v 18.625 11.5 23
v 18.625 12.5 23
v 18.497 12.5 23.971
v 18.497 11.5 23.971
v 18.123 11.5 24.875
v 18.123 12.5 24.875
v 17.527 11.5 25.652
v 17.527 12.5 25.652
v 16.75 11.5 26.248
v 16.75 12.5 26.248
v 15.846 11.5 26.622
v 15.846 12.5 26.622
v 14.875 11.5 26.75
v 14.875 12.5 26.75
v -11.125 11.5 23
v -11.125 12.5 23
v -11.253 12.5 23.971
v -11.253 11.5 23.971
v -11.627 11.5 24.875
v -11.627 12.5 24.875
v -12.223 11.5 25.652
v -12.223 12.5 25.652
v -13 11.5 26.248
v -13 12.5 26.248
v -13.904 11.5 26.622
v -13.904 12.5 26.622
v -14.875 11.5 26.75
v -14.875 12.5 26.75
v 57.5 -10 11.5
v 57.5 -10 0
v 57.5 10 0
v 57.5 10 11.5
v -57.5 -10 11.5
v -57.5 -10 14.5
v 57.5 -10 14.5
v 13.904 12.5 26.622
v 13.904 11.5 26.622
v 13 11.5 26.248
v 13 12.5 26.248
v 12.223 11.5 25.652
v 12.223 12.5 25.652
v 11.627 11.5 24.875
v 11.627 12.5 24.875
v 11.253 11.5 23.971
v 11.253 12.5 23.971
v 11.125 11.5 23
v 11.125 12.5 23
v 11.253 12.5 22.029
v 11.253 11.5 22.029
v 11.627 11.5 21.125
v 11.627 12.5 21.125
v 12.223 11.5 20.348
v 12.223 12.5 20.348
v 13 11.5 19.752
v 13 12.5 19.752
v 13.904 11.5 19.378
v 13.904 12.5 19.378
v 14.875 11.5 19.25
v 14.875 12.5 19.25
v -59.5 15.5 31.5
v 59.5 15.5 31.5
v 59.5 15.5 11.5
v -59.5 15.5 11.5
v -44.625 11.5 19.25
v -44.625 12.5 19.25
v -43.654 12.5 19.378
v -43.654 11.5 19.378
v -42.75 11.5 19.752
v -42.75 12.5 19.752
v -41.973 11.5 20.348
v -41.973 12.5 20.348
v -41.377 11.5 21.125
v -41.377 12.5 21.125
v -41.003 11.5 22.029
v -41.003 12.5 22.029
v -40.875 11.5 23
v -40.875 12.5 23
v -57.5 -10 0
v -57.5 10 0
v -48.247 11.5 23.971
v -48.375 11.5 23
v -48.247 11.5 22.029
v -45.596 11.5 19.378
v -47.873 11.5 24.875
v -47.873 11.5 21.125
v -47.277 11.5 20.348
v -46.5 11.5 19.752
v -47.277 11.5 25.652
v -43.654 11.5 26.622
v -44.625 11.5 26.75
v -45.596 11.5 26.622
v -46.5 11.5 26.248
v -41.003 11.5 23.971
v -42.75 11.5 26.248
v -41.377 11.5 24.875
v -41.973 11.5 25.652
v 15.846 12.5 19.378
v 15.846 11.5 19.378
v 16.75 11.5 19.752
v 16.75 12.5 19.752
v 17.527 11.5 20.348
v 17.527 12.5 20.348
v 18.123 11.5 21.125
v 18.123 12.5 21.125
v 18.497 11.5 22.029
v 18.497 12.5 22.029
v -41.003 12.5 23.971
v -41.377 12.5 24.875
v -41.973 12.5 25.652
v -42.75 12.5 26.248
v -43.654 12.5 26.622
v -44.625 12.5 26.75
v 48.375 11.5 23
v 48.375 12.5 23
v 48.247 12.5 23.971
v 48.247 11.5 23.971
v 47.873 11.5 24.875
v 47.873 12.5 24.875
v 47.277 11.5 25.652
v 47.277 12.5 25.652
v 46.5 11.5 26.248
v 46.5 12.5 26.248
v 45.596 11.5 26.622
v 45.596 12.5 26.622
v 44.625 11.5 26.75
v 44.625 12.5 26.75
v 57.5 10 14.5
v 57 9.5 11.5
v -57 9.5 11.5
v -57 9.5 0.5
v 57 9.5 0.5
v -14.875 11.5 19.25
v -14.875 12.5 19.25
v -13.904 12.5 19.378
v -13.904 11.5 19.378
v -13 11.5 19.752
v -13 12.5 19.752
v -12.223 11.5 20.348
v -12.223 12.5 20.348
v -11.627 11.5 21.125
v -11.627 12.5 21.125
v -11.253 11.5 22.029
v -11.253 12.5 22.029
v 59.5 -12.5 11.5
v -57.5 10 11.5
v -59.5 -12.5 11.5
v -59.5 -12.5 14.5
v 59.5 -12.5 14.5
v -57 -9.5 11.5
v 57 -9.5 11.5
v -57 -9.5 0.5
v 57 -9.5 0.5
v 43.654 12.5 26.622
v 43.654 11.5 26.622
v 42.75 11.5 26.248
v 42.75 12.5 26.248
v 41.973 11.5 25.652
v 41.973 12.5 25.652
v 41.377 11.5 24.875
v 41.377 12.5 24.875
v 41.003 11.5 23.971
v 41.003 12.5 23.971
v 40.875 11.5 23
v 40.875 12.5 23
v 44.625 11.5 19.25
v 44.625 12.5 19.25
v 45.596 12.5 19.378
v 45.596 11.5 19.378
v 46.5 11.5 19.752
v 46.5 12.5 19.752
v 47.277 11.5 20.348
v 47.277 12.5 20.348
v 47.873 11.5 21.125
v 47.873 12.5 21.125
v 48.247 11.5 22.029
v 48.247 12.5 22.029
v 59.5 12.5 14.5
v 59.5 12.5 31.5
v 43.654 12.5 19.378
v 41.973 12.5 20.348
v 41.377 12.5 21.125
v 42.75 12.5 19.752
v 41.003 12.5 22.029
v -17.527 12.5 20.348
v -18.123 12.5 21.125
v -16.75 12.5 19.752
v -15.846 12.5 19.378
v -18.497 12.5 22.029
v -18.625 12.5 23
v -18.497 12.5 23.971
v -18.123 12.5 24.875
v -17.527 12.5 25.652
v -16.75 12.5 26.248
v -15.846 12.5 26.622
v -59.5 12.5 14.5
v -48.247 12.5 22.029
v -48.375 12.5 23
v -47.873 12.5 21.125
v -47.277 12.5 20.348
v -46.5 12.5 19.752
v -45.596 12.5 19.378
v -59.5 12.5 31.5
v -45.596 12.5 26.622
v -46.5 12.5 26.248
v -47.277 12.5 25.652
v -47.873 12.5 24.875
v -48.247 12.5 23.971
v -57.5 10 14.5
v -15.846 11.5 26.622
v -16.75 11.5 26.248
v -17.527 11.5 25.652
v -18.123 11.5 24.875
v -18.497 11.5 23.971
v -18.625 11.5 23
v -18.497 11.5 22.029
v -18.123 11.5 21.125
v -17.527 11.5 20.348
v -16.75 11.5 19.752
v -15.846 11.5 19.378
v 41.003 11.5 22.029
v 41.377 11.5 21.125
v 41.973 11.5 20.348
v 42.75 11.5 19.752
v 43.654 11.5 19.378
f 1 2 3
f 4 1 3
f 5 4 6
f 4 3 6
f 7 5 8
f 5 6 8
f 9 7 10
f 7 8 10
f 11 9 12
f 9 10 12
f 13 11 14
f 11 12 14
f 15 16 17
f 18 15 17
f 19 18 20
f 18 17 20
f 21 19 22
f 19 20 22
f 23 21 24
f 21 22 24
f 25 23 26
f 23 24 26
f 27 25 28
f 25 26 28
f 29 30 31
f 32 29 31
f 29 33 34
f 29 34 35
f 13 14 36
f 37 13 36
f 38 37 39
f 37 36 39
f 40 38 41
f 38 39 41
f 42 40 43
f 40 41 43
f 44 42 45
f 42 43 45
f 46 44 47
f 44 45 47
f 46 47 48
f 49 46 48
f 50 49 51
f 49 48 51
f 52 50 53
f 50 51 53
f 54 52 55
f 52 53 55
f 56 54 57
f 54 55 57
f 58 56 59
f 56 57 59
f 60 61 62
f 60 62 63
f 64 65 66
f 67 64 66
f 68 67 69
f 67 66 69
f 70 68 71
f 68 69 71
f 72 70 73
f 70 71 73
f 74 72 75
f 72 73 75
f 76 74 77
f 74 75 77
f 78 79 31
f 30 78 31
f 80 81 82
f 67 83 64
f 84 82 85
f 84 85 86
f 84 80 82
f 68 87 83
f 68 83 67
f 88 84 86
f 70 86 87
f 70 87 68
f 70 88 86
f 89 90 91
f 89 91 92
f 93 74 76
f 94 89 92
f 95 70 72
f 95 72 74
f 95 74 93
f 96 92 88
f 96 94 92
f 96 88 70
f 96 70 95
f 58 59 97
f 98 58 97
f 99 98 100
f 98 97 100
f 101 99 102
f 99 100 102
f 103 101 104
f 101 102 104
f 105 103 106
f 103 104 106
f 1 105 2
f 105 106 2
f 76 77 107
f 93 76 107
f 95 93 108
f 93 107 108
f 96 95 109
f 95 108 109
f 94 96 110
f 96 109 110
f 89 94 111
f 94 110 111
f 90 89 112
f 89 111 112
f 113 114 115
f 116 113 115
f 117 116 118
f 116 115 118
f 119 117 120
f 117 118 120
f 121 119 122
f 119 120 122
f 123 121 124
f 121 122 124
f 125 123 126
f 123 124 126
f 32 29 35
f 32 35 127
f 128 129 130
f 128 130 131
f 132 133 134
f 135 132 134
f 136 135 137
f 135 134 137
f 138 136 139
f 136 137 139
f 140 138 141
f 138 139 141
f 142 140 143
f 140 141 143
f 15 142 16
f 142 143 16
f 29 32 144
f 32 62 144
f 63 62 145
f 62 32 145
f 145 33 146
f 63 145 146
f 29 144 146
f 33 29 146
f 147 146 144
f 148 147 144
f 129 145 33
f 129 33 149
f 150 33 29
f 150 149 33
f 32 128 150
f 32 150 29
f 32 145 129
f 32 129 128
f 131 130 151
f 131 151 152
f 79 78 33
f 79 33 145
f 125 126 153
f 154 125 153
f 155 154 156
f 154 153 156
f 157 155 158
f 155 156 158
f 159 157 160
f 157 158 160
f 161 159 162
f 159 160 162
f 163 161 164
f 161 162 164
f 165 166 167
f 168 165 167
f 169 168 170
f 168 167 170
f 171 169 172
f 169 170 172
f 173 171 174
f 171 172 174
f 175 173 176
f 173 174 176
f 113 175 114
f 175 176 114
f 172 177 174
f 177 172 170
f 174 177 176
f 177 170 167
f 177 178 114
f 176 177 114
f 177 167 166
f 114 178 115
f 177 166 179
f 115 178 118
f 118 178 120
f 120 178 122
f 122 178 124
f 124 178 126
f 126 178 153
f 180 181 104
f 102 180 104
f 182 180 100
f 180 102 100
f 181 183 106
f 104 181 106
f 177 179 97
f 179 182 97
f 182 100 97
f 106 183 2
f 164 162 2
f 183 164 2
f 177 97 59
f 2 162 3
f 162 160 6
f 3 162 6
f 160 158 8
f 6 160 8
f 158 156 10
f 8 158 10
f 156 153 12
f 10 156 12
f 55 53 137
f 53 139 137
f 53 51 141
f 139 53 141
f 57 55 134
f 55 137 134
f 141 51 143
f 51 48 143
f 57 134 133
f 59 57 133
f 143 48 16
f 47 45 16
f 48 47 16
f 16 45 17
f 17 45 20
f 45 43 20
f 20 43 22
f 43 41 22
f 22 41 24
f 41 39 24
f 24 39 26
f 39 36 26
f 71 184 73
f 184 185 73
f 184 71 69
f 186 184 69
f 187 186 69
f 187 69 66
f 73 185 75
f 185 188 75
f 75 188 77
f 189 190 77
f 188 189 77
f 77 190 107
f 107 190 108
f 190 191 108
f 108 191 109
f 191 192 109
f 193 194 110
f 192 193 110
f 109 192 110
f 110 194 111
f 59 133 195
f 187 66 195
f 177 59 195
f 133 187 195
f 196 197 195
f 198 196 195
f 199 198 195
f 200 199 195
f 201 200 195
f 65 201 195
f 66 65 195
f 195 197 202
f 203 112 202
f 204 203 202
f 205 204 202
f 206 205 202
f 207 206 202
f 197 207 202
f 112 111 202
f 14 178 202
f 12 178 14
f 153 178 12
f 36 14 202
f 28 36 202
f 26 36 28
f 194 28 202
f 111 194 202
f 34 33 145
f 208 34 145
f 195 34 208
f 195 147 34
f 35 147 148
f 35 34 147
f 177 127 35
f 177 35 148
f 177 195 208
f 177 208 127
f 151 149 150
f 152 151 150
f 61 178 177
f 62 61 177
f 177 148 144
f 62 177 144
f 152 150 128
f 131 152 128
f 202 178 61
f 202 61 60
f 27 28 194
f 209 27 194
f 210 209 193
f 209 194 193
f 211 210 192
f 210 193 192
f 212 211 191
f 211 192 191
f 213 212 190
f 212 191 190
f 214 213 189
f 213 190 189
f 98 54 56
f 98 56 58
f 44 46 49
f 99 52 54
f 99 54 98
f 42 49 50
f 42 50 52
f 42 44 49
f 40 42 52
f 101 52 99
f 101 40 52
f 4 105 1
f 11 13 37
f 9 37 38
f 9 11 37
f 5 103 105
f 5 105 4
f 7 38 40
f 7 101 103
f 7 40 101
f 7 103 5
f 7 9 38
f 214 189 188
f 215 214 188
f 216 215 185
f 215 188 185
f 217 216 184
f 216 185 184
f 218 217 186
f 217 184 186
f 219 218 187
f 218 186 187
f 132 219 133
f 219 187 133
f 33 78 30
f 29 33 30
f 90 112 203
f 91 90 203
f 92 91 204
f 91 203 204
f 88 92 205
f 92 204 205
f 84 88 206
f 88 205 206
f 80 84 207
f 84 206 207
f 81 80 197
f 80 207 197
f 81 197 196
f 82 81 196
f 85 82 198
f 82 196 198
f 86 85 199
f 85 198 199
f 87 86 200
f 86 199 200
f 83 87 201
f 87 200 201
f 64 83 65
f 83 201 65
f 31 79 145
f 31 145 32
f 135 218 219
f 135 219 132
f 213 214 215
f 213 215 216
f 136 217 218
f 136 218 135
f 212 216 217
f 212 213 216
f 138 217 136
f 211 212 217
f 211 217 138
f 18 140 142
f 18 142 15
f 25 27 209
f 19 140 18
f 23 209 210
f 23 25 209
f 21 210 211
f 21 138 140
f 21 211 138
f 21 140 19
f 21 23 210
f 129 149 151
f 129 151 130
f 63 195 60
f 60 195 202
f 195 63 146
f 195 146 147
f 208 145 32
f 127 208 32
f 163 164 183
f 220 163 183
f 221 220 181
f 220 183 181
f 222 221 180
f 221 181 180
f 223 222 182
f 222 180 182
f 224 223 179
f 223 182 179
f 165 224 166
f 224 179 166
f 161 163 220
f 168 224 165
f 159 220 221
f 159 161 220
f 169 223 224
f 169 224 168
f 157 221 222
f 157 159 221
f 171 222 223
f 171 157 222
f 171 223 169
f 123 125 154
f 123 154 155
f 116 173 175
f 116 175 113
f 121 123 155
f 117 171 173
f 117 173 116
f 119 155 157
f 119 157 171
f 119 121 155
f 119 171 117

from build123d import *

# Parameters (mm, degrees)
F0_W     = 115
F0_H     = 20
F1_DEPTH = 11.5
F2_W     = 119
F2_H     = 25
F2_W_2   = 115
F2_H_2   = 20
F3_DEPTH = 3
F4_W     = 114
F4_H     = 19
F5_DEPTH = 11
F6_W     = 119
F6_H     = 17
F6_H_2   = 3
F7_DEPTH = 3
F9_DEPTH = 1


with BuildPart() as f1:
    # F0 (on Top) → F1 (new body)
    with BuildSketch(Plane.XY):
        Rectangle(F0_W, F0_H)
    extrude(amount=F1_DEPTH)

    # F4 (on face) → F5 (cut)
    with BuildSketch(Plane.XY.offset(11.5)):
        Rectangle(F4_W, F4_H)
    extrude(amount=-F5_DEPTH, mode=Mode.SUBTRACT)


with BuildPart() as f3:
    # F2 (on face) → F3 (new body)
    with BuildSketch(Plane.XY.offset(11.5)):
        Rectangle(F2_W, F2_H)
        Rectangle(F2_W_2, F2_H_2, mode=Mode.SUBTRACT)
    extrude(amount=F3_DEPTH)

    # F6 (on face) → F7 (join)
    with BuildSketch(Plane(origin=(0, 12.5, 0), x_dir=(-1, 0, 0), z_dir=(0, 1, 0))):
        with Locations((0, 23)):
            Rectangle(F6_W, F6_H)
        with Locations((0, 13)):
            Rectangle(F6_W, F6_H_2)
    extrude(amount=F7_DEPTH)

    # F8 (on face) → F9 (join)
    with BuildSketch(Plane.XZ.offset(-12.5)):
        with BuildLine():
            ThreePointArc((-48.375, 23), (-47.2766504294, 20.3483495706), (-44.625, 19.25))
            Line((-44.625, 19.25), (-44.625, 23))
            Line((-44.625, 23), (-48.375, 23))
        make_face()
        with BuildLine():
            Line((-44.625, 23), (-44.625, 19.25))
            ThreePointArc((-44.625, 19.25), (-41.9733495706, 20.3483495706), (-40.875, 23))
            Line((-40.875, 23), (-44.625, 23))
        make_face()
        with BuildLine():
            ThreePointArc((-40.875, 23), (-41.9733495706, 25.6516504294), (-44.625, 26.75))
            Line((-44.625, 26.75), (-44.625, 23))
            Line((-44.625, 23), (-40.875, 23))
        make_face()
        with BuildLine():
            Line((-44.625, 23), (-44.625, 26.75))
            ThreePointArc((-44.625, 26.75), (-47.2766504294, 25.6516504294), (-48.375, 23))
            Line((-48.375, 23), (-44.625, 23))
        make_face()
        with BuildLine():
            Line((-14.875, 23), (-14.875, 26.75))
            ThreePointArc((-14.875, 26.75), (-17.5266504294, 25.6516504294), (-18.625, 23))
            Line((-18.625, 23), (-14.875, 23))
        make_face()
        with BuildLine():
            ThreePointArc((-11.125, 23), (-12.2233495706, 25.6516504294), (-14.875, 26.75))
            Line((-14.875, 26.75), (-14.875, 23))
            Line((-14.875, 23), (-11.125, 23))
        make_face()
        with BuildLine():
            ThreePointArc((-18.625, 23), (-17.5266504294, 20.3483495706), (-14.875, 19.25))
            Line((-14.875, 19.25), (-14.875, 23))
            Line((-14.875, 23), (-18.625, 23))
        make_face()
        with BuildLine():
            Line((-14.875, 23), (-14.875, 19.25))
            ThreePointArc((-14.875, 19.25), (-12.2233495706, 20.3483495706), (-11.125, 23))
            Line((-11.125, 23), (-14.875, 23))
        make_face()
        with BuildLine():
            Line((14.875, 23), (18.625, 23))
            ThreePointArc((18.625, 23), (17.5266504294, 25.6516504294), (14.875, 26.75))
            Line((14.875, 26.75), (14.875, 23))
        make_face()
        with BuildLine():
            Line((11.125, 23), (14.875, 23))
            Line((14.875, 23), (14.875, 26.75))
            ThreePointArc((14.875, 26.75), (12.2233495706, 25.6516504294), (11.125, 23))
        make_face()
        with BuildLine():
            Line((14.875, 19.25), (14.875, 23))
            Line((14.875, 23), (11.125, 23))
            ThreePointArc((11.125, 23), (12.2233495706, 20.3483495706), (14.875, 19.25))
        make_face()
        with BuildLine():
            ThreePointArc((14.875, 19.25), (17.5266504294, 20.3483495706), (18.625, 23))
            Line((18.625, 23), (14.875, 23))
            Line((14.875, 23), (14.875, 19.25))
        make_face()
        with BuildLine():
            Line((44.625, 23), (48.375, 23))
            ThreePointArc((48.375, 23), (47.2766504294, 25.6516504294), (44.625, 26.75))
            Line((44.625, 26.75), (44.625, 23))
        make_face()
        with BuildLine():
            Line((40.875, 23), (44.625, 23))
            Line((44.625, 23), (44.625, 26.75))
            ThreePointArc((44.625, 26.75), (41.9733495706, 25.6516504294), (40.875, 23))
        make_face()
        with BuildLine():
            Line((44.625, 19.25), (44.625, 23))
            Line((44.625, 23), (40.875, 23))
            ThreePointArc((40.875, 23), (41.9733495706, 20.3483495706), (44.625, 19.25))
        make_face()
        with BuildLine():
            ThreePointArc((44.625, 19.25), (47.2766504294, 20.3483495706), (48.375, 23))
            Line((48.375, 23), (44.625, 23))
            Line((44.625, 23), (44.625, 19.25))
        make_face()
    extrude(amount=F9_DEPTH)


solid = Compound([f1.part, f3.part])
